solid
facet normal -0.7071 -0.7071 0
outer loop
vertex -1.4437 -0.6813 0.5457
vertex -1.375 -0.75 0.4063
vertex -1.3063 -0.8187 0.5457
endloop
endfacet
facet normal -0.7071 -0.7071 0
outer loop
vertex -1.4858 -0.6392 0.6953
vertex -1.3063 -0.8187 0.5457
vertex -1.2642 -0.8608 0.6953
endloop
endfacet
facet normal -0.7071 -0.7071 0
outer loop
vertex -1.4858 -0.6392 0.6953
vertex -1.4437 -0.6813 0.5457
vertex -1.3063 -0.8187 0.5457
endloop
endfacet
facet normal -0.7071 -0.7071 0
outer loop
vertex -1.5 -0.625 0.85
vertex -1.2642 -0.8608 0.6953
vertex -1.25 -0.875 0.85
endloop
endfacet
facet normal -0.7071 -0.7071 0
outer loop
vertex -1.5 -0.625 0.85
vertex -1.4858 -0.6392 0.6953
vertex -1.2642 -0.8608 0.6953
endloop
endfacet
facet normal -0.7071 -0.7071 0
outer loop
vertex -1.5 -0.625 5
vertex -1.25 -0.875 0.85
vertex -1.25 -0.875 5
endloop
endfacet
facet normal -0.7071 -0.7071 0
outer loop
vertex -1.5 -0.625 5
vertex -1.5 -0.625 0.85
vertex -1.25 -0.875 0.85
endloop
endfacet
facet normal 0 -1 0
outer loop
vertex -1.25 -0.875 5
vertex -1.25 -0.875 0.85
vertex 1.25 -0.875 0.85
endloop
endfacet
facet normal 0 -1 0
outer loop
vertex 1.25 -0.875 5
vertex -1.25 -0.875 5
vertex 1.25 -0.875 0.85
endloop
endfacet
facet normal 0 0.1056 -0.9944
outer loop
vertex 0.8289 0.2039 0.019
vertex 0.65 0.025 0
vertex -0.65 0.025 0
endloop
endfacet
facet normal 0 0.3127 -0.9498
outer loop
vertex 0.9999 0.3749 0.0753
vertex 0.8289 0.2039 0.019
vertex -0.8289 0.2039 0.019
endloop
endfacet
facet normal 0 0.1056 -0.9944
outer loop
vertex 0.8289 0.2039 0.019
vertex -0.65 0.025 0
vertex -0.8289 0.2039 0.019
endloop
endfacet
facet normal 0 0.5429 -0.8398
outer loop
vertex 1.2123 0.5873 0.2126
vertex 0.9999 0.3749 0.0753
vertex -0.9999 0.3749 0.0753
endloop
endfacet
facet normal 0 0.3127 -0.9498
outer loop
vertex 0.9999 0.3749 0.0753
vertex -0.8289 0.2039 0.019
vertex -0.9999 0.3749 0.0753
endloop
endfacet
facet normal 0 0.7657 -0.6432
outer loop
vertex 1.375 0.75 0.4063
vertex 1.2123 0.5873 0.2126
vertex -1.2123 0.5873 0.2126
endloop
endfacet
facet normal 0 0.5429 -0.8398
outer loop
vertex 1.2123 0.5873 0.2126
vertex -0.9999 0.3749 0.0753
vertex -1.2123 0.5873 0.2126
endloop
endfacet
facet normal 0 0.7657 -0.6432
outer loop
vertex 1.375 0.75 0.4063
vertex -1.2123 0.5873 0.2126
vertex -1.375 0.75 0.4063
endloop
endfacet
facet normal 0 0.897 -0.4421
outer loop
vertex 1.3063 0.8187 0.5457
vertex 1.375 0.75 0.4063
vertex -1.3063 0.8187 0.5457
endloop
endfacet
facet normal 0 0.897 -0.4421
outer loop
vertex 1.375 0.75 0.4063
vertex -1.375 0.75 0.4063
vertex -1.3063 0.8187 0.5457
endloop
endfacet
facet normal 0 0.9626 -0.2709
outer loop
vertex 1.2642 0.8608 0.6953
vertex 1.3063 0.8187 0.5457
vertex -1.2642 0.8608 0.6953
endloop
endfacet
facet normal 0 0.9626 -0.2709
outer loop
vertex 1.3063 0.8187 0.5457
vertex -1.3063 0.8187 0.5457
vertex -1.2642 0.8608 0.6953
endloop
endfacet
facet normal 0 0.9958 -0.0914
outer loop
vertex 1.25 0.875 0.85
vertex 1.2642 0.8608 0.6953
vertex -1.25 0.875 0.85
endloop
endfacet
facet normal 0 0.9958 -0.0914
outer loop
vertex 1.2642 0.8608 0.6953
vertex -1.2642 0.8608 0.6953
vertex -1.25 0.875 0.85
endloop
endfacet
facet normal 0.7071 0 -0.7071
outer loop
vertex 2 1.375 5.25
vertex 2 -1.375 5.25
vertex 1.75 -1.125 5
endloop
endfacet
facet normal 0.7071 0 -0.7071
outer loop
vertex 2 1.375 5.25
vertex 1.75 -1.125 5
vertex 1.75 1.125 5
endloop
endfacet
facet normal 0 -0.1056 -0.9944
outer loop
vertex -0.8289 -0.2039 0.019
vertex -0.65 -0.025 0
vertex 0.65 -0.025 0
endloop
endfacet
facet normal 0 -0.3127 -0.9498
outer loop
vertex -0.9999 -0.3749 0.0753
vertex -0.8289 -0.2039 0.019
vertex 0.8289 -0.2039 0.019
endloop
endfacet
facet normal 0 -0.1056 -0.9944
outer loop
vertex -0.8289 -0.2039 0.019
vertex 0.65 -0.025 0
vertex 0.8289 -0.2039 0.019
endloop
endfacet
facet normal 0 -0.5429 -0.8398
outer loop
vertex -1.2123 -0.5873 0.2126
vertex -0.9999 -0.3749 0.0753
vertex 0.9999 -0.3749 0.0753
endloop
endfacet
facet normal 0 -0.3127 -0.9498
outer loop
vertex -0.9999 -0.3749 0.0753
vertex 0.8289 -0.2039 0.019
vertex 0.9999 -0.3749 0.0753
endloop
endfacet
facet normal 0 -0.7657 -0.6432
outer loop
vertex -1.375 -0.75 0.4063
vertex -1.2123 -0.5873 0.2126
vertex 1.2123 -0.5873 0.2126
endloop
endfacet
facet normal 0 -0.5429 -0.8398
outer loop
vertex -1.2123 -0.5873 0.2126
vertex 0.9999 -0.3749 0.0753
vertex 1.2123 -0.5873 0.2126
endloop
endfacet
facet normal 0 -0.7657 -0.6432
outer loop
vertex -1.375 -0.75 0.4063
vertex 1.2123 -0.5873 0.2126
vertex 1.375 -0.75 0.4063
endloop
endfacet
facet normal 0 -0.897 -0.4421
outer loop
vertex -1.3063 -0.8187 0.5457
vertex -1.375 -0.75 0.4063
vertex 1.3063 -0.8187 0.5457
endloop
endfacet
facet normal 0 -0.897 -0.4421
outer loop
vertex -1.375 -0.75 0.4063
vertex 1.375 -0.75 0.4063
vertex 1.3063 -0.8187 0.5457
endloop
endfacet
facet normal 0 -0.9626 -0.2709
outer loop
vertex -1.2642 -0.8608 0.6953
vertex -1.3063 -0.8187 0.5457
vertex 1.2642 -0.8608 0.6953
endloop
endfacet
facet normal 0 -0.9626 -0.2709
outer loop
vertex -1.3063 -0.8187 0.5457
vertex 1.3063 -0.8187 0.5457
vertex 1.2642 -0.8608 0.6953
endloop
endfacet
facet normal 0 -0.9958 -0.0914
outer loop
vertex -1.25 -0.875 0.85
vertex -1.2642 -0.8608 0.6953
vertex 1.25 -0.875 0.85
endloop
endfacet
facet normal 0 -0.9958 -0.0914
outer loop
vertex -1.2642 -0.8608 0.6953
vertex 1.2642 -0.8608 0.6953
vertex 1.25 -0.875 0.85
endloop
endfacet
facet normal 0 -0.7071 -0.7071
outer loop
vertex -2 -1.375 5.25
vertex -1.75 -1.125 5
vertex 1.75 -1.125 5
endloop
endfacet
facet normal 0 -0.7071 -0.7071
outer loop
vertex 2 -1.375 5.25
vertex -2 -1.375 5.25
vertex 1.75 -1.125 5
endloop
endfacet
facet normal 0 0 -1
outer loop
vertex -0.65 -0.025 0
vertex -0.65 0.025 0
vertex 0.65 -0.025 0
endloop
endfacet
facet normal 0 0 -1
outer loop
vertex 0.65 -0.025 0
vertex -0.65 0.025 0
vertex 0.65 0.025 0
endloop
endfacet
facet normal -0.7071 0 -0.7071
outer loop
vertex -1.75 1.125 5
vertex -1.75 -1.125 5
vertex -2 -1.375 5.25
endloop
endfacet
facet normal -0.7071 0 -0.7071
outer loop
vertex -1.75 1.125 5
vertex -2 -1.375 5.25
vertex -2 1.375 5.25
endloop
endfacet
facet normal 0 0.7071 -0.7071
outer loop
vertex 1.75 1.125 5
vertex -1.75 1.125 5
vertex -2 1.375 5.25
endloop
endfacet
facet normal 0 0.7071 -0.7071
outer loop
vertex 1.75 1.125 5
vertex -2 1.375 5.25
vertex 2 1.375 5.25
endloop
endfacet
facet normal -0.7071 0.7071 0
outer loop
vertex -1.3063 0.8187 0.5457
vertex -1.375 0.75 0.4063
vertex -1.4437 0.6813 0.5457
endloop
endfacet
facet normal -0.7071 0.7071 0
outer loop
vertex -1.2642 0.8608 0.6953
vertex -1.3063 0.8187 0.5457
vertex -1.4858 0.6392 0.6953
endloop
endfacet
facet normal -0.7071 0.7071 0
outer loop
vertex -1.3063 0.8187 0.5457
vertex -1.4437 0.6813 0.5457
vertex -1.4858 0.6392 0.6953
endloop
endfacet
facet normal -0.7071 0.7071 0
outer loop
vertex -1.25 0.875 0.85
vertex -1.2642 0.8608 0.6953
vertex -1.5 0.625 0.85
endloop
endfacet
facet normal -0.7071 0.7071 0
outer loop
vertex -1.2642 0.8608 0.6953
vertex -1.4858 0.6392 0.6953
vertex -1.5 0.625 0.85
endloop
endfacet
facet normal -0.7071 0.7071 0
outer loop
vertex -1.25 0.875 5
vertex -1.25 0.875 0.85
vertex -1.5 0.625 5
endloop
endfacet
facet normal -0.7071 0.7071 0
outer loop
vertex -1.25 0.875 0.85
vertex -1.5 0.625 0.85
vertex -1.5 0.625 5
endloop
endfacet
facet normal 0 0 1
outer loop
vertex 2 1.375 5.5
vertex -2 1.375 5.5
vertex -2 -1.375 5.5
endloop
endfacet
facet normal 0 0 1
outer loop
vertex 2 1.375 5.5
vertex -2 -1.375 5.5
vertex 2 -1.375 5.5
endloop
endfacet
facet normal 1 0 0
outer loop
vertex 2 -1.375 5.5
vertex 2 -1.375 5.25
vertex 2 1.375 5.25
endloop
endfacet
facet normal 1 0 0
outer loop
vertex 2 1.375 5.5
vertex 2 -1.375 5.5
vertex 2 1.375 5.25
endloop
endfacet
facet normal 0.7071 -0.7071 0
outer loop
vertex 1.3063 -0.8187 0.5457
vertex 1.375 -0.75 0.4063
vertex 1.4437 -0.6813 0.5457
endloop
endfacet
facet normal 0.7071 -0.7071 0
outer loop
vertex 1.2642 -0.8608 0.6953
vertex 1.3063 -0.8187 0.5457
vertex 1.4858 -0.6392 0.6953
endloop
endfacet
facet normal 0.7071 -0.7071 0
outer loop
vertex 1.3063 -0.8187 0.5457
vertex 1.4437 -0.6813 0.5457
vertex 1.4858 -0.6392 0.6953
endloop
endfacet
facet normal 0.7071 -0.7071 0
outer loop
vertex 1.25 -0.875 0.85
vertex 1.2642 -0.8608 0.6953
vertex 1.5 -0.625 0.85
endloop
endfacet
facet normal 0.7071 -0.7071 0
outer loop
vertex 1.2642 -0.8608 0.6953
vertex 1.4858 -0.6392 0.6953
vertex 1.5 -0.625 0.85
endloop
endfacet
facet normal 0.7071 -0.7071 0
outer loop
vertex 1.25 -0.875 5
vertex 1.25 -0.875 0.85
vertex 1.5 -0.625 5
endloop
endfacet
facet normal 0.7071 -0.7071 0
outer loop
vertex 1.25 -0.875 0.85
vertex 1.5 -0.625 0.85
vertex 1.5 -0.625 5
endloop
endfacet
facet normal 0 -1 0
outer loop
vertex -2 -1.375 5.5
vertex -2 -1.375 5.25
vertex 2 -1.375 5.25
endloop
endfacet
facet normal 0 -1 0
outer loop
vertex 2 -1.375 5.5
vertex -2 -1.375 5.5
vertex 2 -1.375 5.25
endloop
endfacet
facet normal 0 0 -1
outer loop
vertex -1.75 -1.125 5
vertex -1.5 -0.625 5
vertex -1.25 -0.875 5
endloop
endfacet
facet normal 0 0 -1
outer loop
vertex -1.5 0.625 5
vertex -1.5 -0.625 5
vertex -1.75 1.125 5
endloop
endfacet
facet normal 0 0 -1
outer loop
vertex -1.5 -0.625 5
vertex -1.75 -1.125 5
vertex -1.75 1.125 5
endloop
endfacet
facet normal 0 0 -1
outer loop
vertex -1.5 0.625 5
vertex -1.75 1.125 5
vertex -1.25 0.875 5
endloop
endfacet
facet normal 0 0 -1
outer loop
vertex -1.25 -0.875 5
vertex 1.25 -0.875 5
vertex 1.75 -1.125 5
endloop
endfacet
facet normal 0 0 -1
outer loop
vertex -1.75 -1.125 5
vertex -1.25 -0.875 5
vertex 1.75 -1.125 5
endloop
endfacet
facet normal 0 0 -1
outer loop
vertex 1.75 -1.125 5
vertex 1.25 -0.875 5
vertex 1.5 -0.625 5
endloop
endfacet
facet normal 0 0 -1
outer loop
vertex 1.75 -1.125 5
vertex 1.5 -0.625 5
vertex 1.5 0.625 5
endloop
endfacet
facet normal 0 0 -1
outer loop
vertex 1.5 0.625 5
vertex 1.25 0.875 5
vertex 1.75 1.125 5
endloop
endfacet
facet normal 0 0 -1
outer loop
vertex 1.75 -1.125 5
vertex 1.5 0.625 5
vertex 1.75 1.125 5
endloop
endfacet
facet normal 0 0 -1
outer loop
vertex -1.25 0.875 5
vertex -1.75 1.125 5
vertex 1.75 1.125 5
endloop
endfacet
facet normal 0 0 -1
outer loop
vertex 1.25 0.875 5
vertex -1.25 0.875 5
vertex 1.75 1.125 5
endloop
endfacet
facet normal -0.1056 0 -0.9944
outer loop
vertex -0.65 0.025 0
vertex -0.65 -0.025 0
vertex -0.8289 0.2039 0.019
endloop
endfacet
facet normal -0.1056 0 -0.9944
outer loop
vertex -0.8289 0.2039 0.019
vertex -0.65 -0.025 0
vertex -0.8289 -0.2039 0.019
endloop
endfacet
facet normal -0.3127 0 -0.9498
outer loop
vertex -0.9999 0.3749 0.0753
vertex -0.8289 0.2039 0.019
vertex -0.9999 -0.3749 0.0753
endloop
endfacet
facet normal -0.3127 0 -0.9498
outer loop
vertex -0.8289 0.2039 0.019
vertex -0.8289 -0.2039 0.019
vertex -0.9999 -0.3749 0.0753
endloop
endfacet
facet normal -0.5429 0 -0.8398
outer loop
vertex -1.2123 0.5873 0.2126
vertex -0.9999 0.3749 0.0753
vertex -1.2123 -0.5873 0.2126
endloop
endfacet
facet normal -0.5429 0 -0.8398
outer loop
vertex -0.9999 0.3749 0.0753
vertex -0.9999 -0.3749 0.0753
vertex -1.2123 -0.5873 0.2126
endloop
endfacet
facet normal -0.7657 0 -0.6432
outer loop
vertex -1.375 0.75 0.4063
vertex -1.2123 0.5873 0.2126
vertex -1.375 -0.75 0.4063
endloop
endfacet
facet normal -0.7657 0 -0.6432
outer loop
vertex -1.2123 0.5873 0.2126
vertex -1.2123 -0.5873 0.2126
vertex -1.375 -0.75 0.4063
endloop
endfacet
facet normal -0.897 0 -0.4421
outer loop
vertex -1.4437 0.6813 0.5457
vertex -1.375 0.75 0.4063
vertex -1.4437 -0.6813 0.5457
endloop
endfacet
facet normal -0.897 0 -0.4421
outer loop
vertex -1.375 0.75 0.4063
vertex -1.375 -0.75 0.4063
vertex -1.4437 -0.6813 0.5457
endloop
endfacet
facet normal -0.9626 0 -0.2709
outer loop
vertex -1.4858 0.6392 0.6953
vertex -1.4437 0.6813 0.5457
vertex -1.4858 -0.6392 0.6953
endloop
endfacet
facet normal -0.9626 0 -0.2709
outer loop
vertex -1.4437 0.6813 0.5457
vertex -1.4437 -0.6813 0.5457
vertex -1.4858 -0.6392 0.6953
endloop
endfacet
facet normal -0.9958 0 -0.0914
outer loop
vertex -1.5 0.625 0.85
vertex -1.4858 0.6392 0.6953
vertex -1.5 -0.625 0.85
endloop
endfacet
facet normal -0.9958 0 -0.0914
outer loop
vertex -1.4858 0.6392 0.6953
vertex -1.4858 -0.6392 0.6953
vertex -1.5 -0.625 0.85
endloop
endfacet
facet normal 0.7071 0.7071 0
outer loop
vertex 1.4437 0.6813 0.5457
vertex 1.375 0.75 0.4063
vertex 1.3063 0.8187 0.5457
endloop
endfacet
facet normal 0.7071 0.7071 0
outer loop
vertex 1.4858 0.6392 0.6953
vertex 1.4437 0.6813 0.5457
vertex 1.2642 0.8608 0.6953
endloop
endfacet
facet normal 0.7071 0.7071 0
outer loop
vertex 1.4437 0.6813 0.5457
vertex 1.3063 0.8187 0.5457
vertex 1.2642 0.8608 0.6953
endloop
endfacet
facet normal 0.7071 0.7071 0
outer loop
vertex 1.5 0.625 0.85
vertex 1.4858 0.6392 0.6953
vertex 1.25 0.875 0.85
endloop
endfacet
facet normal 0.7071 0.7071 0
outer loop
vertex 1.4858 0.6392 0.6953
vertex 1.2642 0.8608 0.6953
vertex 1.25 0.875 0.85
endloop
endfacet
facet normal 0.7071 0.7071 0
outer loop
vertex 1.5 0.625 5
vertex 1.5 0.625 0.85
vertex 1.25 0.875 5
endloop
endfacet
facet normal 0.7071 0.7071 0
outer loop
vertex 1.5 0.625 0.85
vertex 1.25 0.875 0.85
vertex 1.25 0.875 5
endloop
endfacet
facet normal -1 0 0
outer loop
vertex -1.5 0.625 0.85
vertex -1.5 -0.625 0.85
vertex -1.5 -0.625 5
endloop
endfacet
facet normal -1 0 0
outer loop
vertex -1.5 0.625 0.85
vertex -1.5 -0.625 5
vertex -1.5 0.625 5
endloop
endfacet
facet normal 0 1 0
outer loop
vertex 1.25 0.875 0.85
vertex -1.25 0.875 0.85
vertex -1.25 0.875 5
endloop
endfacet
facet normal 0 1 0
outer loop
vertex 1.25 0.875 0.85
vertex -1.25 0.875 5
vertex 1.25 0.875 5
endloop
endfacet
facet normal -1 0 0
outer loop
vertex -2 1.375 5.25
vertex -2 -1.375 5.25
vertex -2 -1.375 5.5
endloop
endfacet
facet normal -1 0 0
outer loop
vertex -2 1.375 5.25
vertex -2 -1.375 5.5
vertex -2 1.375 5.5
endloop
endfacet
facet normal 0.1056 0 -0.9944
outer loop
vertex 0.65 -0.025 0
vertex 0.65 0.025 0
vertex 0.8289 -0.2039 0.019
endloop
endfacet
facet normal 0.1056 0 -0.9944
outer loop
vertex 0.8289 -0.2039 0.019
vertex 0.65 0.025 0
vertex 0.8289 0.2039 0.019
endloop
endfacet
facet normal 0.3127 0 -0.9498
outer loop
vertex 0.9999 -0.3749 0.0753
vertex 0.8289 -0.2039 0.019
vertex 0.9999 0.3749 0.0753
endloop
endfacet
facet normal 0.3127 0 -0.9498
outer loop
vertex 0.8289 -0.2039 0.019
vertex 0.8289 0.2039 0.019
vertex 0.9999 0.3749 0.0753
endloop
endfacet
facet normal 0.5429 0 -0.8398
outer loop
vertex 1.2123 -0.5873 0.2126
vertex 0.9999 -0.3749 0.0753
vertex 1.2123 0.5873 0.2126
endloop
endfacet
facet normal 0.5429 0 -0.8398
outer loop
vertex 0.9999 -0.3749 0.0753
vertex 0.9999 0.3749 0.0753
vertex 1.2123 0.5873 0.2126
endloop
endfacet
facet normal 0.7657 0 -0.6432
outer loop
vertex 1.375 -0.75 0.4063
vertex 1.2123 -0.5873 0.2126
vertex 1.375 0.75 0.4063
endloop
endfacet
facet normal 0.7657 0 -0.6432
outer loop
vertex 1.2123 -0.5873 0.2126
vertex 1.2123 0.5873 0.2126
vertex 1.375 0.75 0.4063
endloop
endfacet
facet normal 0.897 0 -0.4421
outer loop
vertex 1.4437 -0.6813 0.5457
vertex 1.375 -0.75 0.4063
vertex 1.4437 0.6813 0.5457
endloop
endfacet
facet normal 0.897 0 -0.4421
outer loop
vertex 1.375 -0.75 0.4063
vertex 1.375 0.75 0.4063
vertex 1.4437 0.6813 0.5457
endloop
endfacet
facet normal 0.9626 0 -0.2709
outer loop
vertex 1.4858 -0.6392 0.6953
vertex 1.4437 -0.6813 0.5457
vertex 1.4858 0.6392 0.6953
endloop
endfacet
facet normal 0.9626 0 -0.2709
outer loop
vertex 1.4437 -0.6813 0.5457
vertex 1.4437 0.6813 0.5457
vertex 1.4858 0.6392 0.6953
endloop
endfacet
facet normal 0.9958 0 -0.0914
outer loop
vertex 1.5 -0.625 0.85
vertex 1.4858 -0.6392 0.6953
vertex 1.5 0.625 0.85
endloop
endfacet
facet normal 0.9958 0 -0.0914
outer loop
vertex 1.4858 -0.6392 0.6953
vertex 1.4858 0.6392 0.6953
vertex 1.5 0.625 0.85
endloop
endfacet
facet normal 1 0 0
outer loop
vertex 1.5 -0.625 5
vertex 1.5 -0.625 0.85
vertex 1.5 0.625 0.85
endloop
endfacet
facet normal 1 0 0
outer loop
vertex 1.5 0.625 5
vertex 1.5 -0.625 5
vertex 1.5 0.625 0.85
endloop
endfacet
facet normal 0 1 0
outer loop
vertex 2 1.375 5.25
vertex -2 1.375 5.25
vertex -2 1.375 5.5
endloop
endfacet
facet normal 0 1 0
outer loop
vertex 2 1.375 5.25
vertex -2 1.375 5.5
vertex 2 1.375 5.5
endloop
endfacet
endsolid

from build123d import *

# Parameters (mm, degrees)
SKETCH1_W           = 3
SKETCH1_H           = 1.75
BOSS_EXTRUDE1_DEPTH = 5
SKETCH2_W           = 4
SKETCH2_H           = 2.75
SKETCH2_W_2         = 3
SKETCH2_H_2         = 1.75
BOSS_EXTRUDE2_DEPTH = 0.5
CHAMFER1_SIZE       = 0.25
FILLET1_R           = 0.85


with BuildPart() as part:
    # Sketch1 → Boss-Extrude1 (new body)
    with BuildSketch(Plane.XY):
        Rectangle(SKETCH1_W, SKETCH1_H)
    extrude(amount=BOSS_EXTRUDE1_DEPTH)

    # Sketch2 → Boss-Extrude2 (add)
    # profile 1 of 2: a face of its own
    with BuildSketch(Plane.XY.offset(5)):
        Rectangle(SKETCH2_W, SKETCH2_H)
        Rectangle(SKETCH2_W_2, SKETCH2_H_2, mode=Mode.SUBTRACT)
    # profile 2 of 2: a face of its own
    with BuildSketch(Plane.XY.offset(5)):
        Rectangle(SKETCH2_W_2, SKETCH2_H_2)
    extrude(amount=BOSS_EXTRUDE2_DEPTH)

    # Chamfer1
    chamfer1_edges = [part.edges().sort_by_distance(p)[0] for p in [
        (0, -1.375, 5),
        (2, 0, 5),
        (0, 1.375, 5),
        (-2, 0, 5),
        (1.5, -0.875, 2.5),
        (-1.5, -0.875, 2.5),
        (-1.5, 0.875, 2.5),
        (1.5, 0.875, 2.5),
    ]]
    chamfer(chamfer1_edges, length=CHAMFER1_SIZE)

    # Fillet1
    # the kernel refuses this fillet: 0.85 mm, written as the material it takes off along each edge
    with BuildSketch(Plane(origin=(-3.375, 0.875, 0), x_dir=(0, 0, 1), z_dir=(1, 0, 0)), Plane(origin=(3.375, -0.875, 0), x_dir=(0, 0, 1), z_dir=(-1, 0, 0))) as fillet1_piece_1:
        with BuildLine():
            CenterArc((FILLET1_R, FILLET1_R), FILLET1_R, 180, 90)
            Line((0, FILLET1_R), (0, 0))
            Line((0, 0), (FILLET1_R, 0))
        make_face()
    extrude(amount=6.75, mode=Mode.SUBTRACT)
    with BuildSketch(Plane(origin=(-1.5, -2.75, 0), x_dir=(0, 0, 1), z_dir=(0, 1, 0)), Plane(origin=(1.5, 2.75, 0), x_dir=(0, 0, 1), z_dir=(0, -1, 0))) as fillet1_piece_2:
        with BuildLine():
            CenterArc((FILLET1_R, FILLET1_R), FILLET1_R, 180, 90)
            Line((0, FILLET1_R), (0, 0))
            Line((0, 0), (FILLET1_R, 0))
        make_face()
    extrude(amount=5.5, mode=Mode.SUBTRACT)


solid = part.part
